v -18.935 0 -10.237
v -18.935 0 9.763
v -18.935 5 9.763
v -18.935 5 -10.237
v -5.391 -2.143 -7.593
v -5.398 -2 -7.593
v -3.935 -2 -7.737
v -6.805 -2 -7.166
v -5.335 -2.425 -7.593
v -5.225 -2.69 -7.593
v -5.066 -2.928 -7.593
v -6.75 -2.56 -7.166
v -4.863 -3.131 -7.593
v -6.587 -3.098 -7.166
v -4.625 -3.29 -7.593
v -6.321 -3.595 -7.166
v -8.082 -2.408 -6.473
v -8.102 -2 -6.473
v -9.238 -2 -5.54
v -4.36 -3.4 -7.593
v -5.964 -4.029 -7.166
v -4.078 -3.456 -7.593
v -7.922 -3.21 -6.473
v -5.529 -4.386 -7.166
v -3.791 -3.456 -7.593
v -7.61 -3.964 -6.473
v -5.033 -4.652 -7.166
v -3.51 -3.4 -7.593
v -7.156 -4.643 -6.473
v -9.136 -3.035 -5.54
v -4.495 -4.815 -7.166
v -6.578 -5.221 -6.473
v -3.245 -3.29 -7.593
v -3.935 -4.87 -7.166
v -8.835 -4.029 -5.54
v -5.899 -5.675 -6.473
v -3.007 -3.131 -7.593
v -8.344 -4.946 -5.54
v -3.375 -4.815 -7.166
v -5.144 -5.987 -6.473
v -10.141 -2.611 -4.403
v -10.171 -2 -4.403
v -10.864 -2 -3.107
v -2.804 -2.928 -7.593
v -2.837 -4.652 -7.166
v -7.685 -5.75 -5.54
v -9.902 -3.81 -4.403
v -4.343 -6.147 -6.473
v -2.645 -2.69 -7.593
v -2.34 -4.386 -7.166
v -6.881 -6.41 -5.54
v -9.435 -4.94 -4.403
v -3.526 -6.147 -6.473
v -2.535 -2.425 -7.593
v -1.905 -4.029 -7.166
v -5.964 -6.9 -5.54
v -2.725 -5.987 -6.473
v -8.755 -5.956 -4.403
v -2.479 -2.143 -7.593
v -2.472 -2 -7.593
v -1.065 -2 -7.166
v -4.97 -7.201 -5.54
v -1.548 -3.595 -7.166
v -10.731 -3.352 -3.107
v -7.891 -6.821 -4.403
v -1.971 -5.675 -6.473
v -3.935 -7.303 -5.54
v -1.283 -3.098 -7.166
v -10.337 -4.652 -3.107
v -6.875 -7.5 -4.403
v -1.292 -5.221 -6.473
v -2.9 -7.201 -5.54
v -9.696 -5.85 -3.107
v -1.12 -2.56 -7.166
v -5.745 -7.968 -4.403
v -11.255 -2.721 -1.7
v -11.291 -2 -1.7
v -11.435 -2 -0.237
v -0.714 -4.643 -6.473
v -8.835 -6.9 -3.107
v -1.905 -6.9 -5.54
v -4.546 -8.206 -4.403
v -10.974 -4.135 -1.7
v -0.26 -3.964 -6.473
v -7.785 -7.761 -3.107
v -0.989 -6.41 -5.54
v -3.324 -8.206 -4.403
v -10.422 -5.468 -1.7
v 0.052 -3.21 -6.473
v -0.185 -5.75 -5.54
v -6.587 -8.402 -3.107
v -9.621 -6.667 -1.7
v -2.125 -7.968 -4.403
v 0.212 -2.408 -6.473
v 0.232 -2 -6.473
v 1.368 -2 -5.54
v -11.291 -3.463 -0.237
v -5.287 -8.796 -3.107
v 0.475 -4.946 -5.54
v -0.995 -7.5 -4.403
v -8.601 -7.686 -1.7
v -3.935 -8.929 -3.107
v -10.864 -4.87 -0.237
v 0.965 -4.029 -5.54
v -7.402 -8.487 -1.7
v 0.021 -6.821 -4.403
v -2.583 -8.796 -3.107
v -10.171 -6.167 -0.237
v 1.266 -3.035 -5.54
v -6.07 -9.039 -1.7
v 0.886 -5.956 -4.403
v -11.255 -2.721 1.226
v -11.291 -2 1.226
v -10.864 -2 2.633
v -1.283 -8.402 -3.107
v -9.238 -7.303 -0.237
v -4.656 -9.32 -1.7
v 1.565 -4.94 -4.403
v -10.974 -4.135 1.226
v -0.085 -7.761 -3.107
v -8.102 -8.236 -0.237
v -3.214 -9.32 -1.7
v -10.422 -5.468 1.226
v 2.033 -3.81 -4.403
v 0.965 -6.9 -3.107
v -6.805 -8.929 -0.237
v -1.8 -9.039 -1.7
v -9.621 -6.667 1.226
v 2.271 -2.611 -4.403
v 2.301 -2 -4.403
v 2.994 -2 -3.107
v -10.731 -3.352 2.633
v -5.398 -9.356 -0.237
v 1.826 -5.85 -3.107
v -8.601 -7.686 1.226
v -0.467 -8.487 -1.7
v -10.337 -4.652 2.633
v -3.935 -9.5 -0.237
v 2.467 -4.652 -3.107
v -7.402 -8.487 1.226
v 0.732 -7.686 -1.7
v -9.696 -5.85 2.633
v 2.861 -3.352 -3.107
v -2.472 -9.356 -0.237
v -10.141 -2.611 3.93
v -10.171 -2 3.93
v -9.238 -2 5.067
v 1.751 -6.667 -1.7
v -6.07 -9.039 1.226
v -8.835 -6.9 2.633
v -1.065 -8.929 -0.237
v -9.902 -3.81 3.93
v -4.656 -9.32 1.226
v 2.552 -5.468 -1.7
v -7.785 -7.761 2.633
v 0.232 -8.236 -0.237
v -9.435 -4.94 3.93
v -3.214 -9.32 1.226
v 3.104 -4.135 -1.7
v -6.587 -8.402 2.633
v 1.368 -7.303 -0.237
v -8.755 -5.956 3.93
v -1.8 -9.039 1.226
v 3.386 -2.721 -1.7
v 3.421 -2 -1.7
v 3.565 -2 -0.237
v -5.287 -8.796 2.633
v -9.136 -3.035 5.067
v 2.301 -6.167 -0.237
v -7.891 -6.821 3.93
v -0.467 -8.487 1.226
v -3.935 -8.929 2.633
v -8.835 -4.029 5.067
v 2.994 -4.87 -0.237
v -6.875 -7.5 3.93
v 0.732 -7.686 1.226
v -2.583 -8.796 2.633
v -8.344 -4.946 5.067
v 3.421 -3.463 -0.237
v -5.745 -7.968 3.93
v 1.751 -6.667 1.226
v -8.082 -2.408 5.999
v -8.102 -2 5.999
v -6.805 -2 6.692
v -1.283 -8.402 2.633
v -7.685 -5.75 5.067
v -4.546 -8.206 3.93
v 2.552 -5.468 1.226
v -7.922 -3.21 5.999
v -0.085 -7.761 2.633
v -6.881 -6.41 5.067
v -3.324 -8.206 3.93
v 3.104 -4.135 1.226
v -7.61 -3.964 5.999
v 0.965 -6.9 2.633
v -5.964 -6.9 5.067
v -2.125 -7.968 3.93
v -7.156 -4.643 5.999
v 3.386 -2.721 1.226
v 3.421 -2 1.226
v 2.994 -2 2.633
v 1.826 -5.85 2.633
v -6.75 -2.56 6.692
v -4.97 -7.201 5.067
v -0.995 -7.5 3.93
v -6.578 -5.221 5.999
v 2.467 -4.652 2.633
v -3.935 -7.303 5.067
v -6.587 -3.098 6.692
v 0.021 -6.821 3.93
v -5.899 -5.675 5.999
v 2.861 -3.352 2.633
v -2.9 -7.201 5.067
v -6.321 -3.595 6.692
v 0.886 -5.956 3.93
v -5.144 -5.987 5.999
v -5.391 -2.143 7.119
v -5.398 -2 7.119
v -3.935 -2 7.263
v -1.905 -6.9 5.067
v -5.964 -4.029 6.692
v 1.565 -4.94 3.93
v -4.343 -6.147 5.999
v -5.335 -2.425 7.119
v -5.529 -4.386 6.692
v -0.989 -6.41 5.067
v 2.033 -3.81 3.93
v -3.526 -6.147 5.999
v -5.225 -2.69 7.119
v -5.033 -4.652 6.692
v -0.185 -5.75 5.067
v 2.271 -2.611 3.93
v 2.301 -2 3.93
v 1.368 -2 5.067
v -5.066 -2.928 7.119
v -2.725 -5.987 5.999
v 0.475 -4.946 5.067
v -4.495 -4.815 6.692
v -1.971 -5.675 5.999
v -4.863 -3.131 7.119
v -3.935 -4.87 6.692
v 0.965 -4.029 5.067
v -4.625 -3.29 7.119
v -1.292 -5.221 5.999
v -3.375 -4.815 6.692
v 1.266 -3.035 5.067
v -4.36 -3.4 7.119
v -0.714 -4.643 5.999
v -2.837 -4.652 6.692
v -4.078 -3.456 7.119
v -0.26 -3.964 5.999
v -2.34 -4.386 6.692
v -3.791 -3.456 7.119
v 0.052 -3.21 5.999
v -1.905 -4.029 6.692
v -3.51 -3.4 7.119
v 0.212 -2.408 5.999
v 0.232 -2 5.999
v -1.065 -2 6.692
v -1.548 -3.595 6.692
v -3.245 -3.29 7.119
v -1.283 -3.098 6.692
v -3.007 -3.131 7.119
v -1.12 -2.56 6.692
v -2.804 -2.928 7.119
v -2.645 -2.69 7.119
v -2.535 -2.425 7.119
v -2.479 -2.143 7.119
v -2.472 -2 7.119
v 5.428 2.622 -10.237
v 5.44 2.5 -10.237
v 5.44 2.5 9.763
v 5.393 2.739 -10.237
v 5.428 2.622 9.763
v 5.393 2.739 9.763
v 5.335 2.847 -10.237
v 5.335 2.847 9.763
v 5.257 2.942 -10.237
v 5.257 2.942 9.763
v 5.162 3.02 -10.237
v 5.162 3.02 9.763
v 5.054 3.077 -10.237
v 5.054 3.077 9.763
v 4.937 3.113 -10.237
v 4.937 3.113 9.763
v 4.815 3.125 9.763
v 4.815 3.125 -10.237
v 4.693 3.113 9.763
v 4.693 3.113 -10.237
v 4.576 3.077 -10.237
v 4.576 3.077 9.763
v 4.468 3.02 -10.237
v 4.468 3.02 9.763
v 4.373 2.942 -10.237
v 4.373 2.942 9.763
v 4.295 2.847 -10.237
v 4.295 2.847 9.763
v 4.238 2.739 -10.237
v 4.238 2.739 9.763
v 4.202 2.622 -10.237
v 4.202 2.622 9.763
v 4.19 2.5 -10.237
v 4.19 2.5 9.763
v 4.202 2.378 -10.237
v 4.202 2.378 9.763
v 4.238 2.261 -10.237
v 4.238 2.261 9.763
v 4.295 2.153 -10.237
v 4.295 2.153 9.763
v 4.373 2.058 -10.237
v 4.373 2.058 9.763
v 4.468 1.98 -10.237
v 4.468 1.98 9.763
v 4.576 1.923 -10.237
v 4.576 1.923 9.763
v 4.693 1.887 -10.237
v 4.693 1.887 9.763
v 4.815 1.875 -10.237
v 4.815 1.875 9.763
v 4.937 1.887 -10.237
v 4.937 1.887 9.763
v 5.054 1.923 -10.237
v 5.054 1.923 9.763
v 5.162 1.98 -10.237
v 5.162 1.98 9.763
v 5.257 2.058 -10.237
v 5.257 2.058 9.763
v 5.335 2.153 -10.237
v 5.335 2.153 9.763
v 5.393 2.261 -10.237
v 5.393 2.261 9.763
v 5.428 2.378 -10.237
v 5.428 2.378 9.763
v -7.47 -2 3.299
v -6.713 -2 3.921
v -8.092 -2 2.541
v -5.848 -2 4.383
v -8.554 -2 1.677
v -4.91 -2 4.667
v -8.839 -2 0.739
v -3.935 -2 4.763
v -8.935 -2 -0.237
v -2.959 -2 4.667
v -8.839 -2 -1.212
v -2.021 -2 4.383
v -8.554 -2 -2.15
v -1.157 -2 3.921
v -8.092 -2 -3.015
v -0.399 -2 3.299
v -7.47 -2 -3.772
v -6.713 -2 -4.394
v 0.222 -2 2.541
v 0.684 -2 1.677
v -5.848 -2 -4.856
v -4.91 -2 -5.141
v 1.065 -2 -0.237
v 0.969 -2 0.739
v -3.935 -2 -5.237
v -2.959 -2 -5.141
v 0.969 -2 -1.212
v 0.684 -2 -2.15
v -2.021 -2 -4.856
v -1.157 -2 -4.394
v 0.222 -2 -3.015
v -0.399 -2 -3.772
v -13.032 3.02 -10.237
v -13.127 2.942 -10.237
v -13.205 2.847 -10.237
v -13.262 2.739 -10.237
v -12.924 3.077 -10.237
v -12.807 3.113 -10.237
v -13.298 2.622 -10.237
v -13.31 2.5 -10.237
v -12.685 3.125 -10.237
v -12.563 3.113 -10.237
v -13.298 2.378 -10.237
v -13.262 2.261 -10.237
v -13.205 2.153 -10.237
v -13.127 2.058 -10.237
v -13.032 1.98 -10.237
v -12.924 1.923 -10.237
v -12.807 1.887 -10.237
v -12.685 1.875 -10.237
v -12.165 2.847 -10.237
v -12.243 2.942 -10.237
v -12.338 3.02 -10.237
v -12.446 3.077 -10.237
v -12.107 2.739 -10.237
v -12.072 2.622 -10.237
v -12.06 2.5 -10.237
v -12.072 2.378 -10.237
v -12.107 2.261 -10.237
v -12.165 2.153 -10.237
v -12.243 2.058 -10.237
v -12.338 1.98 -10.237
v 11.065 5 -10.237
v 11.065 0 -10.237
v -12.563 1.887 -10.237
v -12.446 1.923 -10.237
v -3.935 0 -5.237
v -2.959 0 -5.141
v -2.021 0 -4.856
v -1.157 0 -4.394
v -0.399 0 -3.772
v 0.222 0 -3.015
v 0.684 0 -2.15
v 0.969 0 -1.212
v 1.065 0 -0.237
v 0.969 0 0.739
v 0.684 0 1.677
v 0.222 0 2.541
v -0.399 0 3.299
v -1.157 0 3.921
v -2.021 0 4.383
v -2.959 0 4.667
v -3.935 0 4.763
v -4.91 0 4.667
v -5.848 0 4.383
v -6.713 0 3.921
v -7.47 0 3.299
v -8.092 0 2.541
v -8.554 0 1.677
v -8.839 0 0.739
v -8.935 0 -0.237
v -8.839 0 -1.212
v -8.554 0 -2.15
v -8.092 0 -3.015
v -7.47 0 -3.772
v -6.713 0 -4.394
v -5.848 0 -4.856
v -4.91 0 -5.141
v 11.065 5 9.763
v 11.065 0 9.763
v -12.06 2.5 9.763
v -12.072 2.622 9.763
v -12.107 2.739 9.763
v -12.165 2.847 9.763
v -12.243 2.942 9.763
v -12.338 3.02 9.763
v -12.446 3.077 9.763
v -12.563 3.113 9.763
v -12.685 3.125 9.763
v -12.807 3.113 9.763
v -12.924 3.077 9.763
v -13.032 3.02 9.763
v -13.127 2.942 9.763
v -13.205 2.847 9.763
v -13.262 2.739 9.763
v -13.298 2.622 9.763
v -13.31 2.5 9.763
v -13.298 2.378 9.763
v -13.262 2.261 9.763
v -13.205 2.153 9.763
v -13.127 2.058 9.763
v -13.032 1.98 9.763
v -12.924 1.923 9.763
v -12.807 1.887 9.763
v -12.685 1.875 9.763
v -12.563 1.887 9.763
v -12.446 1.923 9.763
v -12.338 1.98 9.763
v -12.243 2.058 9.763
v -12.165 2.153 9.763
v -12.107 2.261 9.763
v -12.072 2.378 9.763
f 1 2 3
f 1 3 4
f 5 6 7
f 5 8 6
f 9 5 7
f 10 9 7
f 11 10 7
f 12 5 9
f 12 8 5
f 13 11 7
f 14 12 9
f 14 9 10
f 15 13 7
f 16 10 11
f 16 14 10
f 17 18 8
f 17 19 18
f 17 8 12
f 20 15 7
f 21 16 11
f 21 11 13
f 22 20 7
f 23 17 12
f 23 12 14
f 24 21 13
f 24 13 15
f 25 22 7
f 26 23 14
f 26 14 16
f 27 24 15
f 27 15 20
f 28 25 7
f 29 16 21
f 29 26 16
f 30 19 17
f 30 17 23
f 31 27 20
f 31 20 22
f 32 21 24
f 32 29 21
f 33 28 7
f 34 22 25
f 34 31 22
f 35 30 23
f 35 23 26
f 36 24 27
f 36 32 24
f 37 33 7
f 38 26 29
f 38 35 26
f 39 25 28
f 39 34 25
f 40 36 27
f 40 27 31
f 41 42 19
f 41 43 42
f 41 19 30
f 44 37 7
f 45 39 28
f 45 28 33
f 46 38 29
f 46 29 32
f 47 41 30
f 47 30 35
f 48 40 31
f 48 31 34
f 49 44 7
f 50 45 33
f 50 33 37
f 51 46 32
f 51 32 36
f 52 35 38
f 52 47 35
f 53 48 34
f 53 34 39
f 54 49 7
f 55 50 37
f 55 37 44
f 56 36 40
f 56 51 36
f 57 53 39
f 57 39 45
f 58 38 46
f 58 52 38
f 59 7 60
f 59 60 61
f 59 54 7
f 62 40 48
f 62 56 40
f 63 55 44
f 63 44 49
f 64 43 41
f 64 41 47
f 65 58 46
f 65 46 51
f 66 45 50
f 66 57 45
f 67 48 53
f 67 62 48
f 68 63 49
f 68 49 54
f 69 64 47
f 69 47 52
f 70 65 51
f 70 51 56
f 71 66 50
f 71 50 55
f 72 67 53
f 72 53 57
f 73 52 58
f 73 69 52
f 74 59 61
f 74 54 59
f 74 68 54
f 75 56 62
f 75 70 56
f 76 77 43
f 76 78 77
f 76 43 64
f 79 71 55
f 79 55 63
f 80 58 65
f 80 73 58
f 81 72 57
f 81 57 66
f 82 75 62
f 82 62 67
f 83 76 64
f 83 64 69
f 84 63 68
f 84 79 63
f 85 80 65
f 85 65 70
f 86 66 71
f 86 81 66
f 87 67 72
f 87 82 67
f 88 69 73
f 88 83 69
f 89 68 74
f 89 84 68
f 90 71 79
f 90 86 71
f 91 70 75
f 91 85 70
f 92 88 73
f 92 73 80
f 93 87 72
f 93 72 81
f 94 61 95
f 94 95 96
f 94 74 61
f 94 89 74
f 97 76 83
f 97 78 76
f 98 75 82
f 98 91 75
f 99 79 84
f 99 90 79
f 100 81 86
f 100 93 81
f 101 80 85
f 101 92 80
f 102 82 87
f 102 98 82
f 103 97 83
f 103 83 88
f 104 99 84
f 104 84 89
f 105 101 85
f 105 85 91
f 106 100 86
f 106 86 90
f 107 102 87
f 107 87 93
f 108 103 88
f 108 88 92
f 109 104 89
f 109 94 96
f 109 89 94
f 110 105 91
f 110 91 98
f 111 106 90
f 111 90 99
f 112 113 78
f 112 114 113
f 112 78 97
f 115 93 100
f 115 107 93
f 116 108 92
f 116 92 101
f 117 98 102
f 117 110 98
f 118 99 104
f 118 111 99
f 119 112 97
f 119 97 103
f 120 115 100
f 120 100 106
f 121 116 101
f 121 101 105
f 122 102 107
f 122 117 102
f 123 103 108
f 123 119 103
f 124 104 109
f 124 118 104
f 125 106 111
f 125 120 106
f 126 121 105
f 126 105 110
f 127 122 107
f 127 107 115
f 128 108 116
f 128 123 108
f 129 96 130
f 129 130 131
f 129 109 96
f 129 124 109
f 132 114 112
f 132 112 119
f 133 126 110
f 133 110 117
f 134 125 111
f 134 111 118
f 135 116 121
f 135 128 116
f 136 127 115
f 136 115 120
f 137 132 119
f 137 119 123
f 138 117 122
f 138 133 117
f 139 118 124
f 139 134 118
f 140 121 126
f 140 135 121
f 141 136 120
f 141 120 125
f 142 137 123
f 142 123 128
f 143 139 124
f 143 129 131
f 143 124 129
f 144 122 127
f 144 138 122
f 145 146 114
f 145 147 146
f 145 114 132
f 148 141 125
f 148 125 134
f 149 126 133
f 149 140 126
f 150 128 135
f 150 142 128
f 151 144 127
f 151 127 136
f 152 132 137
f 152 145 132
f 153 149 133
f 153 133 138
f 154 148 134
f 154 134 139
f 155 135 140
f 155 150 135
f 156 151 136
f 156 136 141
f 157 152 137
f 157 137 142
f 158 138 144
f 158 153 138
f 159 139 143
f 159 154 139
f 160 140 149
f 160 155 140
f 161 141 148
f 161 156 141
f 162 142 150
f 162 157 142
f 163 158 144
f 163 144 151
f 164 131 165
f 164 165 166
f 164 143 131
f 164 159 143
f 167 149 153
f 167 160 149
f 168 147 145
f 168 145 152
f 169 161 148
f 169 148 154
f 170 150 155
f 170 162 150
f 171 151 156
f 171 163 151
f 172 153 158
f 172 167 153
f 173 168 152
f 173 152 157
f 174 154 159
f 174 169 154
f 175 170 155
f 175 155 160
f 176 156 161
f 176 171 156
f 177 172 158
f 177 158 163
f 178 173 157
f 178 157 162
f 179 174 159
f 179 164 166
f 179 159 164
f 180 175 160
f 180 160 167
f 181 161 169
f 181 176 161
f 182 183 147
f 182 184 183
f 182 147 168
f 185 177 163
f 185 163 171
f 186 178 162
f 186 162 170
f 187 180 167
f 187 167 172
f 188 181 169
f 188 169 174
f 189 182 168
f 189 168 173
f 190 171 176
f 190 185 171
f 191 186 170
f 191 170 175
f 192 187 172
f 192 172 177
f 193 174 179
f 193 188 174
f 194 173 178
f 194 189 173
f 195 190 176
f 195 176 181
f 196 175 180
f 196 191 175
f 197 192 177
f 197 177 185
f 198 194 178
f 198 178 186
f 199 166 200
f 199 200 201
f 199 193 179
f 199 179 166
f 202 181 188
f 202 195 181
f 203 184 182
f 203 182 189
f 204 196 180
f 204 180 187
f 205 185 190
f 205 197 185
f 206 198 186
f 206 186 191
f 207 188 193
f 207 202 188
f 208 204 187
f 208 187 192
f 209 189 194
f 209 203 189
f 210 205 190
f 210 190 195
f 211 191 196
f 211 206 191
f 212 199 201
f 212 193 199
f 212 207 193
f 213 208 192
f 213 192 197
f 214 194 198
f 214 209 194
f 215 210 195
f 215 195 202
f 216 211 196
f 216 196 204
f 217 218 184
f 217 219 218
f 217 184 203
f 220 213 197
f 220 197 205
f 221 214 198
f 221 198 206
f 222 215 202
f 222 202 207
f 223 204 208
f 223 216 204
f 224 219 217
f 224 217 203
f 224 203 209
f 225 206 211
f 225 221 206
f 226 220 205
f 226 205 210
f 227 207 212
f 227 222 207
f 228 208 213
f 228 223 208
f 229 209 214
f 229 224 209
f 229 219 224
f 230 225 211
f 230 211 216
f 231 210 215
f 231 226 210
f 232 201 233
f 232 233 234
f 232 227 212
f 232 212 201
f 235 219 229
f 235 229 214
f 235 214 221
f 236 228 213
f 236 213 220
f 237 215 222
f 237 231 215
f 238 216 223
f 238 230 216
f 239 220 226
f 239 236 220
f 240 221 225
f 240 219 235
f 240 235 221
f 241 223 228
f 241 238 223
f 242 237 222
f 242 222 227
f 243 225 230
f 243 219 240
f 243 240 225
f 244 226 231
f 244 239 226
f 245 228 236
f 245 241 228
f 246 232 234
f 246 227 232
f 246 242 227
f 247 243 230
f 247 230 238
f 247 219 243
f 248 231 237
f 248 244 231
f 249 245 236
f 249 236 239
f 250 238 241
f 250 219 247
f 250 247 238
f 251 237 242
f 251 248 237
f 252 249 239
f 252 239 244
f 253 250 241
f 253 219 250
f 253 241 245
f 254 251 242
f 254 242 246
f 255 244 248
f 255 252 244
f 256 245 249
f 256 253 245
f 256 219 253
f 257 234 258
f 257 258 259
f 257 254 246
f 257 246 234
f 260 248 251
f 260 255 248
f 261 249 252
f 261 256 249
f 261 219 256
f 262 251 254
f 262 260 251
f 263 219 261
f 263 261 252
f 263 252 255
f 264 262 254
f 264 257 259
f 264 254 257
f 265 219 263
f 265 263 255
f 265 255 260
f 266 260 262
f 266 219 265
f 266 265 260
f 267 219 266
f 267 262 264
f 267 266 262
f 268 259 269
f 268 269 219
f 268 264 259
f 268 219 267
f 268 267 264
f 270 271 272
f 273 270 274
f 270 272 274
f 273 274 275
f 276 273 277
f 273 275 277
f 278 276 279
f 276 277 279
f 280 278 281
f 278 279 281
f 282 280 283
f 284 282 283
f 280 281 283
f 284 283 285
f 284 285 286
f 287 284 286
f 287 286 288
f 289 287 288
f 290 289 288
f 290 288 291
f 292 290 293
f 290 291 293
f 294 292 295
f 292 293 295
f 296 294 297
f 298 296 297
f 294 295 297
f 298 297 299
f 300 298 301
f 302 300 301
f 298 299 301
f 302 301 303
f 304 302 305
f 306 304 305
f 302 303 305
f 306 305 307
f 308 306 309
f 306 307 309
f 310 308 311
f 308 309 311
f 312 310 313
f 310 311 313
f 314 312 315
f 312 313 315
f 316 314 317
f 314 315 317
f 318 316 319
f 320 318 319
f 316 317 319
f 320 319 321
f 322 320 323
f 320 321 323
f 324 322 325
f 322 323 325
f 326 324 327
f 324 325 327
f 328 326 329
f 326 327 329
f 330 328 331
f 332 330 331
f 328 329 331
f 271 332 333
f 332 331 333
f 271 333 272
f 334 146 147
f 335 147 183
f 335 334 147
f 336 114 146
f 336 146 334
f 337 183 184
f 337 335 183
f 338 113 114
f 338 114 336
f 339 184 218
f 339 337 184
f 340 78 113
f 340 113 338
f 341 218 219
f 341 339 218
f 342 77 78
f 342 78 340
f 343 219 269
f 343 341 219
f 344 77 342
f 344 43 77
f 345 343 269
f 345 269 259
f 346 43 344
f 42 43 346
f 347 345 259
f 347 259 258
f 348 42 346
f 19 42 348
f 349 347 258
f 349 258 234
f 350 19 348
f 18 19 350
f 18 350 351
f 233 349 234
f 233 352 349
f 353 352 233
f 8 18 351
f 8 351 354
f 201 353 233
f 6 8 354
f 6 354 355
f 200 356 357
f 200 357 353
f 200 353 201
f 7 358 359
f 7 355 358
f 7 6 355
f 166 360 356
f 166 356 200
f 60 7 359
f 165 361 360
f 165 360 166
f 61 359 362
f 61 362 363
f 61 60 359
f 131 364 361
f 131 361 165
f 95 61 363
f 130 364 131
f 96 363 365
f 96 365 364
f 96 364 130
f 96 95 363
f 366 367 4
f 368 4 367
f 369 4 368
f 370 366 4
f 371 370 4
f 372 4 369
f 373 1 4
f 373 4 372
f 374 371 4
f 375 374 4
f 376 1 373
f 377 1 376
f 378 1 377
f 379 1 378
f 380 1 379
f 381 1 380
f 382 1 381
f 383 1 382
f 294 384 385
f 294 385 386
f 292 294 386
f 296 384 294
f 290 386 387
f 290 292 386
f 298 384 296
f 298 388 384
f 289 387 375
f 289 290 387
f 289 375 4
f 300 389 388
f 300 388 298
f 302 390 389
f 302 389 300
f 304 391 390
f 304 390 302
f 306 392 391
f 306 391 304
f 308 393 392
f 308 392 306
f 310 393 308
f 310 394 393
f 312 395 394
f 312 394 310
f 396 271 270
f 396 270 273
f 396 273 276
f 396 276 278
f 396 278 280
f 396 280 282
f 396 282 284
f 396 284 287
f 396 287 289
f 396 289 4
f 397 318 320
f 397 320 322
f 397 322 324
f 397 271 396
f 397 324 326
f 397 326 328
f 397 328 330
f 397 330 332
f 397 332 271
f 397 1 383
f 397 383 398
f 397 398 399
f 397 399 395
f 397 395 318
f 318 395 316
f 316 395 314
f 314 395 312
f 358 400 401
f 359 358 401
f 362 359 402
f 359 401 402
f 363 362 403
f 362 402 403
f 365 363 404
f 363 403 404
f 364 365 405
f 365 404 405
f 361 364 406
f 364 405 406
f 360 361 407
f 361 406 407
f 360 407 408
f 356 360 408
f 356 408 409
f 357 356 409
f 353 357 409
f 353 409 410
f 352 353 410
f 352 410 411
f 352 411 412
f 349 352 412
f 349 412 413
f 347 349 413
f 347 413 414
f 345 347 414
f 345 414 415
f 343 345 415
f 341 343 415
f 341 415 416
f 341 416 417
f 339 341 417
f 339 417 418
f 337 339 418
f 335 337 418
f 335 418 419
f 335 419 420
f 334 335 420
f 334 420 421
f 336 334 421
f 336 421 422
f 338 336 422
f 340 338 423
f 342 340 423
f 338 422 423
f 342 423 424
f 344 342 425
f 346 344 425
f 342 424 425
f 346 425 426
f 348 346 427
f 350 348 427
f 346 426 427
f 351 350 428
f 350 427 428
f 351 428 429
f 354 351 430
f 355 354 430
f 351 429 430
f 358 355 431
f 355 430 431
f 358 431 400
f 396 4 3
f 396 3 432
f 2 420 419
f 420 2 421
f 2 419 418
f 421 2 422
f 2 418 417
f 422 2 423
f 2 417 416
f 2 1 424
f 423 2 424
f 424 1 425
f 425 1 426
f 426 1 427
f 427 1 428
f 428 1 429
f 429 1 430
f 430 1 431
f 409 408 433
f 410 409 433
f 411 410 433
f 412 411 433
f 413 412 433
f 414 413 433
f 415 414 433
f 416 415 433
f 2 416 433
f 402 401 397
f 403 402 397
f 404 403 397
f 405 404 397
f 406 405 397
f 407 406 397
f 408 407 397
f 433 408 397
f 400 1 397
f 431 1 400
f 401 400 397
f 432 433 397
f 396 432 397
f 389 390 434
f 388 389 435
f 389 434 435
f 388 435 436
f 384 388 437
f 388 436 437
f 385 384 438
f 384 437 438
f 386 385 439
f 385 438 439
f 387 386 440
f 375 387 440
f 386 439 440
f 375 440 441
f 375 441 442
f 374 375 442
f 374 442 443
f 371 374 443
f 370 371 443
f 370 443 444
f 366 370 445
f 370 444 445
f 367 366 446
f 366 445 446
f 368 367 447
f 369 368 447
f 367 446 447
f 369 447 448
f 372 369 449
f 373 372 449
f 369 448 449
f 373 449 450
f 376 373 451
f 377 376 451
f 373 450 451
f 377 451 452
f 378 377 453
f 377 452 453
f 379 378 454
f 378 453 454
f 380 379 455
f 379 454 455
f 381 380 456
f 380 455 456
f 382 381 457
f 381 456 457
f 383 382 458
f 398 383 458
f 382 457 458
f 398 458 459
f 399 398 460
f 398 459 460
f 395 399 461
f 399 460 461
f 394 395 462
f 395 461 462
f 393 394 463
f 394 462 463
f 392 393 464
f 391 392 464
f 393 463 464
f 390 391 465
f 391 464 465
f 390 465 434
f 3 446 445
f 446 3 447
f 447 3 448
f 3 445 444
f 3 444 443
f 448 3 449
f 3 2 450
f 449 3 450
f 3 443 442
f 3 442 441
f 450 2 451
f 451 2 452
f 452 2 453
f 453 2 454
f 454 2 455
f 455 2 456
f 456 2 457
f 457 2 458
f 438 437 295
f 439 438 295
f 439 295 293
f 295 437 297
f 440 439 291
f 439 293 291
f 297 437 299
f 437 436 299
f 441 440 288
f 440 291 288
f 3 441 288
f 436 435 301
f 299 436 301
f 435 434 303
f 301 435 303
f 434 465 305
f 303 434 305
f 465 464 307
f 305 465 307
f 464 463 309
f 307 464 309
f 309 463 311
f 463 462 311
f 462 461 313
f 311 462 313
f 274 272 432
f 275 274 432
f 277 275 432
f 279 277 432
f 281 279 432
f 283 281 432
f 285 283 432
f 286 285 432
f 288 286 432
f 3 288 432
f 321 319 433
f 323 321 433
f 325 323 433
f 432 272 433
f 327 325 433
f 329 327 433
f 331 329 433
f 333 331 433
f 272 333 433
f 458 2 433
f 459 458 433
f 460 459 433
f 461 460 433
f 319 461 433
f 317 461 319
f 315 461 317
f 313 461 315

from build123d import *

# Parameters (mm, degrees)
SKETCH2_W           = 30
SKETCH2_H           = 20
BOSS_EXTRUDE2_DEPTH = 5
SKETCH3_R           = 5
BOSS_EXTRUDE3_DEPTH = 2
REVOLVE1_ANGLE      = 180
SKETCH5_R           = 0.625
CUT_EXTRUDE2_DEPTH  = 20


with BuildPart() as part:
    # Sketch2 → Boss-Extrude2 (new body)
    with BuildSketch(Plane(origin=(0, 0, 0), x_dir=(1, 0, 0), z_dir=(0, 1, 0))):
        with Locations((-3.934911243, 0.236686391)):
            Rectangle(SKETCH2_W, SKETCH2_H)
    extrude(amount=BOSS_EXTRUDE2_DEPTH)

    # Sketch3 → Boss-Extrude3 (add)
    with BuildSketch(Plane.XZ):
        with Locations(Location((-3.934911243, -0.236686391, 0), (0, 0, 270))):
            Circle(SKETCH3_R)
    extrude(amount=BOSS_EXTRUDE3_DEPTH)

    # Sketch4 → Revolve1 (revolve)
    with BuildSketch(Plane(origin=(0, -2, 0), x_dir=(-1, 0, 0), z_dir=(0, -1, 0))):
        with BuildLine():
            Line((3.934911243, -7.263313609), (3.934911243, 7.736686391))
            ThreePointArc((3.934911243, 7.736686391), (11.434911243, 0.236686391), (3.934911243, -7.263313609))
        make_face()
    revolve(axis=Axis((-3.934911243, -2, 7.263313609), (0, 0, 1)), revolution_arc=REVOLVE1_ANGLE)

    # Sketch5 → Cut-Extrude2 (cut)
    with BuildSketch(Plane.XY.offset(9.763313609)):
        with Locations((-12.684911243, 2.5)):
            Circle(SKETCH5_R)
        with Locations((4.815088757, 2.5)):
            Circle(SKETCH5_R)
    extrude(amount=-CUT_EXTRUDE2_DEPTH, mode=Mode.SUBTRACT)


solid = part.part
